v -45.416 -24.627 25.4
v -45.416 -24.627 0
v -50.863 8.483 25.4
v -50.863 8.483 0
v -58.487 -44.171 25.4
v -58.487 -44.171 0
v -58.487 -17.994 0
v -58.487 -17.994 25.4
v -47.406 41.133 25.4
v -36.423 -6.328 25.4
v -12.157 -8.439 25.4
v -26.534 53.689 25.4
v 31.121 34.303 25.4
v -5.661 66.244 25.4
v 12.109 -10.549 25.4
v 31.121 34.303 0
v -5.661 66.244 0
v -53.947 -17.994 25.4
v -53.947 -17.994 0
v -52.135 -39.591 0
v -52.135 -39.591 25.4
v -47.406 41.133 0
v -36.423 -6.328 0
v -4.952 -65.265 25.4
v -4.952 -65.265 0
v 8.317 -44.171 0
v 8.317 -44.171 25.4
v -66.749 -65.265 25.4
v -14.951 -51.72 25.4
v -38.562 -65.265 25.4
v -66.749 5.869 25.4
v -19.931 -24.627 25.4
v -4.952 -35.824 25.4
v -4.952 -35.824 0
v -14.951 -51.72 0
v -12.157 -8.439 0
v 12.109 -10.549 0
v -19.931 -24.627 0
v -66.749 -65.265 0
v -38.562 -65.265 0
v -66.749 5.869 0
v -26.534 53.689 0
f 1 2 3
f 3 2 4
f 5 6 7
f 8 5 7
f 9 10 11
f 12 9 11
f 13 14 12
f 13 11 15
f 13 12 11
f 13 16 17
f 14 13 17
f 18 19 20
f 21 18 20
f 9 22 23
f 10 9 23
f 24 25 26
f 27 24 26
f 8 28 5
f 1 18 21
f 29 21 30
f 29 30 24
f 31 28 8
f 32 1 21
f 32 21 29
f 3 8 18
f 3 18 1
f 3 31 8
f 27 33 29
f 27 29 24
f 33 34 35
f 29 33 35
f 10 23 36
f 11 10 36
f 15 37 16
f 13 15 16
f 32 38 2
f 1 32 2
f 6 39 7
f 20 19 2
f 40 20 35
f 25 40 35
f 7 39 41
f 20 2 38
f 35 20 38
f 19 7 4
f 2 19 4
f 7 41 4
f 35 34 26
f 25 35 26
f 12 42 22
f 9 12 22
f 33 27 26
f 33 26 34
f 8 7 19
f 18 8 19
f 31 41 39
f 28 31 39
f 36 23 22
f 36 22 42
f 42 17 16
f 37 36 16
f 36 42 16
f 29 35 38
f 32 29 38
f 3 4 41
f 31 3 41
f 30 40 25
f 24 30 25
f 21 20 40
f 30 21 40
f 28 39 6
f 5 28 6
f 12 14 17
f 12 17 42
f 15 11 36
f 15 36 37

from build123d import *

# Parameters (mm, degrees)
F1_DEPTH = 25.4
F5_DEPTH = 25.4


# Not quite as in the source:
# - the program builds the solid bodies; features that only make, move or delete a surface that nothing else refers to are left out


with BuildPart() as f1:
    # F0 (on Top) → F1 (new body)
    with BuildSketch(Plane.XY):
        Polygon((-9.2521887273, 24.9605737627), (12.1087450534, -10.5494055897), (21.6147225683, 11.8767181747), align=None)
        Polygon((-12.1572746882, -8.4387370915), (12.1087450534, -10.5494055897), (-9.2521887273, 24.9605737627), align=None)
        Polygon((-36.4232944299, -6.3280685934), (-12.1572746882, -8.4387370915), (-9.2521887273, 24.9605737627), align=None)
        Polygon((-9.2521887273, 24.9605737627), (21.6147225683, 11.8767181747), (31.1207000832, 34.3028419391), align=None)
        Polygon((-41.914541887, 17.4025200419), (-9.2521887273, 24.9605737627), (-47.4057893441, 41.1331086771), align=None)
        Polygon((-26.5335471715, 53.6887505286), (-9.2521887273, 24.9605737627), (-5.661304999, 66.2443923801), align=None)
        Polygon((-5.661304999, 66.2443923801), (-9.2521887273, 24.9605737627), (12.7296975421, 50.2736171596), align=None)
        Polygon((12.7296975421, 50.2736171596), (-9.2521887273, 24.9605737627), (31.1207000832, 34.3028419391), align=None)
        Polygon((-36.4232944299, -6.3280685934), (-9.2521887273, 24.9605737627), (-41.914541887, 17.4025200419), align=None)
        Polygon((-47.4057893441, 41.1331086771), (-9.2521887273, 24.9605737627), (-26.5335471715, 53.6887505286), align=None)
    extrude(amount=F1_DEPTH)


with BuildPart() as f5:
    # F4 (on Top) → F5 (new body)
    with BuildSketch(Plane.XY):
        Polygon((-53.9466738701, -17.9940983653), (-52.1350763738, -39.5913757384), (-38.5621264577, -65.2649849653), (-4.9518779851, -65.2649849653), (8.3174398169, -44.1713742912), (-4.9518779851, -35.8240696191), (-14.9513309923, -51.7197299563), (-19.9307296425, -24.6265847236), (-45.4155802727, -24.6265847236), (-50.8631318808, 8.4827328101), (-66.7493829843, 5.868931645), (-66.7493829843, -65.2649849653), (-58.4871545434, -44.1713742912), (-58.4871545434, -17.9940983653), align=None)
    extrude(amount=F5_DEPTH)


solid = Compound([f1.part, f5.part])
